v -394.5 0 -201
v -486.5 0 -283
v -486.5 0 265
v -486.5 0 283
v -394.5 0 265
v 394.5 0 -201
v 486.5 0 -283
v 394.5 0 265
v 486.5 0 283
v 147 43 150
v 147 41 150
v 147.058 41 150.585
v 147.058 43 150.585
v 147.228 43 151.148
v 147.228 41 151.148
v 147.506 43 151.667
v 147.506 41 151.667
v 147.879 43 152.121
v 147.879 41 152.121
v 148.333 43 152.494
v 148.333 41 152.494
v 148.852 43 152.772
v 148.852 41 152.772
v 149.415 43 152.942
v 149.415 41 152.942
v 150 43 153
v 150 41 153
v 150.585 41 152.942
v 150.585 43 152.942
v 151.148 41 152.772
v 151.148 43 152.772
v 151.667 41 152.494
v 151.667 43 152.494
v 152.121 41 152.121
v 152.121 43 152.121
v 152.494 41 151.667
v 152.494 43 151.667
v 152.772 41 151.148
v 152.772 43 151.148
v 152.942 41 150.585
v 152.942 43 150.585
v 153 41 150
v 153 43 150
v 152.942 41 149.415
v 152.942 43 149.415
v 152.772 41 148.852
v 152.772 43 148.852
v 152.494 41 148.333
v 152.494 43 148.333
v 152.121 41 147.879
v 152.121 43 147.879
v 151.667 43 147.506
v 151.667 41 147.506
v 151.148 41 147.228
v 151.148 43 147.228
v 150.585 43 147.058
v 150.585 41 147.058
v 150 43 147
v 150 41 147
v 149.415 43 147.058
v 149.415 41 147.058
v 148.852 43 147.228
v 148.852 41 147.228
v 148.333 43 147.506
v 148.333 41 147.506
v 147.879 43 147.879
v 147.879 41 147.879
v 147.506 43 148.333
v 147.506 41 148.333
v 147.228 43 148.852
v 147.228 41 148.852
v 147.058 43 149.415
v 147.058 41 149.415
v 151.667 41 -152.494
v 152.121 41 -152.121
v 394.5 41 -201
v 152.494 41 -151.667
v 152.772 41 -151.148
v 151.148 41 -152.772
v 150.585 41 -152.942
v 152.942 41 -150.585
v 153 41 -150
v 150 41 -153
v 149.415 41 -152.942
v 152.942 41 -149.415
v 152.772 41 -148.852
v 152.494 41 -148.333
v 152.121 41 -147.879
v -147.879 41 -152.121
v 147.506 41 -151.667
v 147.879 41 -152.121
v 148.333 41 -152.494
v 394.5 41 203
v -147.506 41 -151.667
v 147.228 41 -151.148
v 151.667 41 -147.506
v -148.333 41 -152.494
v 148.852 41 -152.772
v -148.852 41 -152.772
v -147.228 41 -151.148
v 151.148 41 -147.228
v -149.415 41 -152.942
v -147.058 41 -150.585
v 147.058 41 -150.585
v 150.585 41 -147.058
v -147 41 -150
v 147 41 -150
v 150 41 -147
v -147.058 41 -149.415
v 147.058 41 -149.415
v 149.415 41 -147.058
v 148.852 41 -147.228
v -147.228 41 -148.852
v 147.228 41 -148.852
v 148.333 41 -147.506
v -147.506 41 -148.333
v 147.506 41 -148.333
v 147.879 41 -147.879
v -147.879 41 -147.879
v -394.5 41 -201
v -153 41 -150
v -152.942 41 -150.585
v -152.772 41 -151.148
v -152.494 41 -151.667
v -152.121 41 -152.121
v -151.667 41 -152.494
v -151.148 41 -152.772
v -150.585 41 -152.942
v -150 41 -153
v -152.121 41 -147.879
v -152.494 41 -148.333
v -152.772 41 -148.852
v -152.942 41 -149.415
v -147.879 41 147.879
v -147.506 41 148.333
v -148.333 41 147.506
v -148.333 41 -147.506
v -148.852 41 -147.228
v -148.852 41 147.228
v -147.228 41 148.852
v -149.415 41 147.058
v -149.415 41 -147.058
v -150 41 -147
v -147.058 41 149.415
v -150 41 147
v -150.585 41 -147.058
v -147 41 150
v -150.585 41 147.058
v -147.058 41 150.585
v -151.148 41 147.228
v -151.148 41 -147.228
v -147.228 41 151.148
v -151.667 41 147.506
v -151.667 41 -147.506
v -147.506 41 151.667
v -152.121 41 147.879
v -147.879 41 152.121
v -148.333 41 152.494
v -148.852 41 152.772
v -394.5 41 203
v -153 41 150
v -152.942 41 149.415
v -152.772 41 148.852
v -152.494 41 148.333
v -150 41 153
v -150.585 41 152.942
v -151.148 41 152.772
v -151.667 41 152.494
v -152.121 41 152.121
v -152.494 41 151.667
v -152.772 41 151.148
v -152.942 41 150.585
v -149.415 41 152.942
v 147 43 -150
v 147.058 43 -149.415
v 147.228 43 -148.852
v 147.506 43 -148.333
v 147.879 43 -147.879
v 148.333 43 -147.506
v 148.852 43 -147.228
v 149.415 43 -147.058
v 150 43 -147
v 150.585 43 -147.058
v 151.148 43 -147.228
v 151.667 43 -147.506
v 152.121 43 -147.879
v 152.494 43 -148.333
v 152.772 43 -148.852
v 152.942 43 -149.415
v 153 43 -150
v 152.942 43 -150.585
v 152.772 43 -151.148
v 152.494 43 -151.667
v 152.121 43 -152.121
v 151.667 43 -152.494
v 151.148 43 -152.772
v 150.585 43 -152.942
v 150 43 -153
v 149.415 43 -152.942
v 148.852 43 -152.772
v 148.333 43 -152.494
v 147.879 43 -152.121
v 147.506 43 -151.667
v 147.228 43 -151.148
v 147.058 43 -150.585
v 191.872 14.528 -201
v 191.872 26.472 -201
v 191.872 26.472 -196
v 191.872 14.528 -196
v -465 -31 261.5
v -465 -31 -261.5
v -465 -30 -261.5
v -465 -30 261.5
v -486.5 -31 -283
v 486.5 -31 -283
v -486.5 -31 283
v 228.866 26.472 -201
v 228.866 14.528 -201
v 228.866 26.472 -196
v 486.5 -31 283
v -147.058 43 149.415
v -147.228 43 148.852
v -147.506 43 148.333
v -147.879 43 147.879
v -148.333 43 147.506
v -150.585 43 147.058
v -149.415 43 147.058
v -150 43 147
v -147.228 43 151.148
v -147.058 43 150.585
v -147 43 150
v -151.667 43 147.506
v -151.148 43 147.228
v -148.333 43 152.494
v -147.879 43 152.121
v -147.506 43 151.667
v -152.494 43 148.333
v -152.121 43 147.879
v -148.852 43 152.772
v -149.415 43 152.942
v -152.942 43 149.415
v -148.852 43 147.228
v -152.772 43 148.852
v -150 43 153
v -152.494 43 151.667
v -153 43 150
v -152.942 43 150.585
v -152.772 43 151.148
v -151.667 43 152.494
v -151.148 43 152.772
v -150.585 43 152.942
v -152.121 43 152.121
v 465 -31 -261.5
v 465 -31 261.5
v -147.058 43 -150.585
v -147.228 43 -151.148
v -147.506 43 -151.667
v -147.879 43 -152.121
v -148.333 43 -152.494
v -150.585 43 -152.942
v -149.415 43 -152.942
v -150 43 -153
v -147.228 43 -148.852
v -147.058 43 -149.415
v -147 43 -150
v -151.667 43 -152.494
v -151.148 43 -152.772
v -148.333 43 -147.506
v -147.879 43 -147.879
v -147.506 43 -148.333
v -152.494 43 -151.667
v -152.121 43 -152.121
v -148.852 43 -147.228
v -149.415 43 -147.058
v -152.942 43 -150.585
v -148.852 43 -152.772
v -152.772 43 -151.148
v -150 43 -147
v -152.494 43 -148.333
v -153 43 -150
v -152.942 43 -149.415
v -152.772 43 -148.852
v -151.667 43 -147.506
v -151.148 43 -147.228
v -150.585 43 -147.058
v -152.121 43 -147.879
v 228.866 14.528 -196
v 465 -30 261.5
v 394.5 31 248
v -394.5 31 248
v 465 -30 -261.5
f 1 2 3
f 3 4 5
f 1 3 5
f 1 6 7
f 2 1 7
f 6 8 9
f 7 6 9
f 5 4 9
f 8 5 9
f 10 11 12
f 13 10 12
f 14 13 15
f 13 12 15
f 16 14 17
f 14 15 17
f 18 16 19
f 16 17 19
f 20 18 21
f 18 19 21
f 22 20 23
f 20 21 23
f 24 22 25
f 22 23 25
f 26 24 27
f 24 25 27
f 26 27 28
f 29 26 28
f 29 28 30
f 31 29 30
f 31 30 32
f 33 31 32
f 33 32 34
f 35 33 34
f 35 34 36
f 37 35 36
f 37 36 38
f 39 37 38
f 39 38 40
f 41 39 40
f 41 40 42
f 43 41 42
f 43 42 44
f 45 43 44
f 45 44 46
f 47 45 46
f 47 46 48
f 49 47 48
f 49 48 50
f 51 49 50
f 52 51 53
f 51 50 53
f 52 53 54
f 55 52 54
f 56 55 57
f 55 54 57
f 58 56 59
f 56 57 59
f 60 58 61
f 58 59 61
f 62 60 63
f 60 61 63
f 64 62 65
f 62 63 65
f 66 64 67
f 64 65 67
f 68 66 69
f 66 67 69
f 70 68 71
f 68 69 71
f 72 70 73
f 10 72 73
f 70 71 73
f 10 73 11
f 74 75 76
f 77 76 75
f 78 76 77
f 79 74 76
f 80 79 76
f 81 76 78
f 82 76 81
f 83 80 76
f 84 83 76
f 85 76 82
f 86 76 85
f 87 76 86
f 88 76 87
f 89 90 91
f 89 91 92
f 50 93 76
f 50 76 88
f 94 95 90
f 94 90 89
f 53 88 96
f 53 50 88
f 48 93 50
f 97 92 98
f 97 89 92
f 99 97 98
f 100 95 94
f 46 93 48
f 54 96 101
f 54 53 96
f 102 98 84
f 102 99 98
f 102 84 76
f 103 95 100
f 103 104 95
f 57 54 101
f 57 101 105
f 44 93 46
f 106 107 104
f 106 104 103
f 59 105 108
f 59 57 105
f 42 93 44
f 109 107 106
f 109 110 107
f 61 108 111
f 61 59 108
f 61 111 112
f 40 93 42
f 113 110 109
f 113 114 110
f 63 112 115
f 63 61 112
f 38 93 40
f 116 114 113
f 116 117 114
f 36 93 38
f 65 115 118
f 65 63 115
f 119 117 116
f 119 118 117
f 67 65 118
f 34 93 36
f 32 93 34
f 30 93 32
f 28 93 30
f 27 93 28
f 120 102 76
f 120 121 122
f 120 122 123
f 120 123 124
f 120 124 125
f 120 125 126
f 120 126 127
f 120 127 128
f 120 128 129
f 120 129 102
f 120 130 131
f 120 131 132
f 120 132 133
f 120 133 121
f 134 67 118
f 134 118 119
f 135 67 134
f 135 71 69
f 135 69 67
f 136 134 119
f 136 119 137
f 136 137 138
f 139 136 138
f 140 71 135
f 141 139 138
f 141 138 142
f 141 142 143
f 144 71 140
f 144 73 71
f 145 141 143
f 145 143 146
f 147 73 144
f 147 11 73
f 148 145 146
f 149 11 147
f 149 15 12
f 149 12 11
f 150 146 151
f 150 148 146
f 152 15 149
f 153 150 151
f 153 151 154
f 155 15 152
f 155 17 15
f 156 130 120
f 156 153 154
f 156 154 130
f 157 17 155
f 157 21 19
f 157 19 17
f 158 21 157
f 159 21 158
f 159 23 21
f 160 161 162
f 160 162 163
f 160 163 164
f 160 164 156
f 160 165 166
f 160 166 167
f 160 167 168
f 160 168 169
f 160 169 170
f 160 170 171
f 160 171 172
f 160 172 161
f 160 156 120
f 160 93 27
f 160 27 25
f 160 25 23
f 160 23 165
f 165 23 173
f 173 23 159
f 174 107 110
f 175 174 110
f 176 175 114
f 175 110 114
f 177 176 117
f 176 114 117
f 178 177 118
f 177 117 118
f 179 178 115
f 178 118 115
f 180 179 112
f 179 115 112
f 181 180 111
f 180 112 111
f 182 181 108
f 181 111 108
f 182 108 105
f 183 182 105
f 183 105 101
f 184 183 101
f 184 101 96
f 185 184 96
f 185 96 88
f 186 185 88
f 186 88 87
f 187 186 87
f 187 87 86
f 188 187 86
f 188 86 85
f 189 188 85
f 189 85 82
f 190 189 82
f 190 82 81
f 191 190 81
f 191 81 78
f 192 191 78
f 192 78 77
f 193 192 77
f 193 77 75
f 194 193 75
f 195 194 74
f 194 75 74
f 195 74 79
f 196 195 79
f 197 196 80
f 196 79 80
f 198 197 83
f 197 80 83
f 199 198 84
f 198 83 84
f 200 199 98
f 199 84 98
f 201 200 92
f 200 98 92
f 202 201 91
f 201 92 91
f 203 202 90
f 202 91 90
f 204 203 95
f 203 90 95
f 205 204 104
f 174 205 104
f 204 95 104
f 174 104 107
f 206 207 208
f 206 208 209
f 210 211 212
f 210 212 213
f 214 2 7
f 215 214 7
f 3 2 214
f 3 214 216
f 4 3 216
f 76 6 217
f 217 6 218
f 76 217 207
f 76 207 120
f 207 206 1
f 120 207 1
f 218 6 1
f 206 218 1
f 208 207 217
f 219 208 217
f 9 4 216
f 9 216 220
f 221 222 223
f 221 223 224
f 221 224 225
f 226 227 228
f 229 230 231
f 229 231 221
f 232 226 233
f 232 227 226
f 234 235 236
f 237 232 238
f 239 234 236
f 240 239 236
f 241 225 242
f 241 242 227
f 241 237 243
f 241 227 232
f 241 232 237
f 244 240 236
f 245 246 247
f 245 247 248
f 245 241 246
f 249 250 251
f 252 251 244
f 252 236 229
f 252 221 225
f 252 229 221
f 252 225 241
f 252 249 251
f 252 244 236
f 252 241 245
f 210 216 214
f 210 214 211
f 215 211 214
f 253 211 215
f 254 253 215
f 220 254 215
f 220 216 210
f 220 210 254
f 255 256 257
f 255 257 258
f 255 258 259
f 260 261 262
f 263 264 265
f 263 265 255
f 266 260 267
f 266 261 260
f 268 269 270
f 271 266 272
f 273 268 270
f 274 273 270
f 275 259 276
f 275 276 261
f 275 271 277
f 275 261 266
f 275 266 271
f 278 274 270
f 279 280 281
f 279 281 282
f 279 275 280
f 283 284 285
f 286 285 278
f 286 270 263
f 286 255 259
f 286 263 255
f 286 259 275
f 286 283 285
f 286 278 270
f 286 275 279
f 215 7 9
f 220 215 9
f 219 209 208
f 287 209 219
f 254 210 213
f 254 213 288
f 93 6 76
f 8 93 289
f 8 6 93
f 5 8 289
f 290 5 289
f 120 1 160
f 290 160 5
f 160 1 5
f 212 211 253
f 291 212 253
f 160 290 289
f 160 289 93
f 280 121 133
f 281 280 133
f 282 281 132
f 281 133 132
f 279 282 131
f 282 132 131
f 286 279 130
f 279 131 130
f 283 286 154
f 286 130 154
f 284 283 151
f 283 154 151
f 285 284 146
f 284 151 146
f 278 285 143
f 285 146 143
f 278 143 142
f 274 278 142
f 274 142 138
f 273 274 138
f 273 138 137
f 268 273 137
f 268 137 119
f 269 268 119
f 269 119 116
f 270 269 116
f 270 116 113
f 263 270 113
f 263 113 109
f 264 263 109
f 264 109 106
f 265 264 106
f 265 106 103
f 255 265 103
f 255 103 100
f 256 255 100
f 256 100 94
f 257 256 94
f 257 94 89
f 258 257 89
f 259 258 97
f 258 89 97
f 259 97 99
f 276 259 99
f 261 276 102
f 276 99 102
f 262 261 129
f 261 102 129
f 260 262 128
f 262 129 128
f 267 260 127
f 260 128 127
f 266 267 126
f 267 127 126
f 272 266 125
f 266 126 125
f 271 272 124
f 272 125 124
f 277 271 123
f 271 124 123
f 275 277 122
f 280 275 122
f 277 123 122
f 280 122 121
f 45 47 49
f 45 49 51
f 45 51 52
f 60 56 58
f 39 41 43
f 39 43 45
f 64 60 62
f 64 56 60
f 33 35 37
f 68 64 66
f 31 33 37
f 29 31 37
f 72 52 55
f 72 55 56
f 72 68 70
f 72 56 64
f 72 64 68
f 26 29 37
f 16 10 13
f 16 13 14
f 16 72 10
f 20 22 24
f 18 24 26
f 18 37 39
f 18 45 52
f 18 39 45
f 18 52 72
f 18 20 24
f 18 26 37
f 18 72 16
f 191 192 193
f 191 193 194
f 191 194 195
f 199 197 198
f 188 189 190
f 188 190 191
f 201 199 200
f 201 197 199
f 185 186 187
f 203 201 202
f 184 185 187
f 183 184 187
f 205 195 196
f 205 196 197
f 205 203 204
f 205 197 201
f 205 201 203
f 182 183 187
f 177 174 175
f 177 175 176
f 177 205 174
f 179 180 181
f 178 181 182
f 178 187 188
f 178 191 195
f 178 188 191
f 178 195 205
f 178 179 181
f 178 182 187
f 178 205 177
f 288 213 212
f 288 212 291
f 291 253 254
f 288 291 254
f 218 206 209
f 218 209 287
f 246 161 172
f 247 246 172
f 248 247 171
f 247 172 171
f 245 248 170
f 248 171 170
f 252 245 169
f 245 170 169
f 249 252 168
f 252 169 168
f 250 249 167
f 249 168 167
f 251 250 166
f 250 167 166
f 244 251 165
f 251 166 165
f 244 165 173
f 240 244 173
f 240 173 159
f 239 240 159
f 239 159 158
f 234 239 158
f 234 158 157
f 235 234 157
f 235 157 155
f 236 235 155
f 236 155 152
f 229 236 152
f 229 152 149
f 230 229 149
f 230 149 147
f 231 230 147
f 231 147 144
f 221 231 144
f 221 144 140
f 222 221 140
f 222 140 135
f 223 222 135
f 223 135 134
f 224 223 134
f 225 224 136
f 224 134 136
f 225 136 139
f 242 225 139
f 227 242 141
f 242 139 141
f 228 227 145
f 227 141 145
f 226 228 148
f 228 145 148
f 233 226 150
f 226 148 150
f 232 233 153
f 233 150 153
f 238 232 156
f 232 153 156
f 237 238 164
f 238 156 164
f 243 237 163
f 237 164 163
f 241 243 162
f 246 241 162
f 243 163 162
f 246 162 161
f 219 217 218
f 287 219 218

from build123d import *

# Parameters (mm, degrees)
F0_W      = 973
F0_H      = 566
F1_DEPTH  = 31
F2_W      = 789
F2_H      = 466
F3_DEPTH  = 41
F4_W      = 36.994547
F4_H      = 11.94332
F5_DEPTH  = 5
F6_W      = 930
F6_H      = 523
F7_DEPTH  = 1
F8_R      = 3
F9_DEPTH  = 43
F11_DEPTH = 881.001


with BuildPart() as f1:
    # F0 (on Front) → F1 (new body)
    with BuildSketch(Plane.XZ):
        Rectangle(F0_W, F0_H)
    extrude(amount=F1_DEPTH)

    # F2 (on face) → F3 (join)
    with BuildSketch(Plane(origin=(0, 0, 0), x_dir=(-1, 0, 0), z_dir=(0, 1, 0))):
        with Locations((0, 32)):
            Rectangle(F2_W, F2_H)
    extrude(amount=F3_DEPTH)

    # F4 (on face) → F5 (cut)
    with BuildSketch(Plane(origin=(0, 0, -201), x_dir=(1, 0, 0), z_dir=(0, 0, -1))):
        with Locations((210.368886, -20.5)):
            Rectangle(F4_W, F4_H)
    extrude(amount=-F5_DEPTH, mode=Mode.SUBTRACT)

    # F6 (on face) → F7 (cut)
    with BuildSketch(Plane.XZ.offset(31)):
        Rectangle(F6_W, F6_H)
    extrude(amount=-F7_DEPTH, mode=Mode.SUBTRACT)

    # F8 (on face) → F9 (join)
    with BuildSketch(Plane(origin=(0, 0, 0), x_dir=(-1, 0, 0), z_dir=(0, 1, 0))):
        with Locations((-150, 150)):
            Circle(F8_R)
        with Locations((150, 150)):
            Circle(F8_R)
        with Locations((-150, -150)):
            Circle(F8_R)
        with Locations((150, -150)):
            Circle(F8_R)
    extrude(amount=F9_DEPTH)

    # F10 (on face) → F11 (cut, through all)
    with BuildSketch(Plane.YZ.offset(394.5)):
        Polygon((41, 265), (0, 265), (31, 248), (41, 203), align=None)
    extrude(amount=-F11_DEPTH, mode=Mode.SUBTRACT)


solid = f1.part
